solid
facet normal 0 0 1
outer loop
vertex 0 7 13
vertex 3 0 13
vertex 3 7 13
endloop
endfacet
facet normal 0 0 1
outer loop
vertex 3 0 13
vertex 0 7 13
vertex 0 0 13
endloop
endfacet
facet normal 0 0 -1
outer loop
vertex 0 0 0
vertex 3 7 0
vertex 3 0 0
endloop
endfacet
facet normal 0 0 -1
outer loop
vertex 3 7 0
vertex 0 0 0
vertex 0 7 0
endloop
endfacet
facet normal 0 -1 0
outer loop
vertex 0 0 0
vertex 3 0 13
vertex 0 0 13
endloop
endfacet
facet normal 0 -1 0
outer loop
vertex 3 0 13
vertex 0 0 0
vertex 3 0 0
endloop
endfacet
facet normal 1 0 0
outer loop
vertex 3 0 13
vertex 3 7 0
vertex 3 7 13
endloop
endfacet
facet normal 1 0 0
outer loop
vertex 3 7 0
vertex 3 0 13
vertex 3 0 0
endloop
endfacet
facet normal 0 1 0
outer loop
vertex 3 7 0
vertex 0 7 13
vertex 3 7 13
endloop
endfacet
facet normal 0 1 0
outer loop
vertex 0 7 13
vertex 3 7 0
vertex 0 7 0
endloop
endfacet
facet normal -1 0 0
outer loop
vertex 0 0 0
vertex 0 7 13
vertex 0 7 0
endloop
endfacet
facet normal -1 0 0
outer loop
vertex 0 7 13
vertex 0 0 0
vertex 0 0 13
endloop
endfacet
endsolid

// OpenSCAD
// Generated by SolidPython 1.0.1 on 2020-07-29 00:46:54


cube(size = [3, 7, 13]);
/***********************************************
*********      SolidPython code:      **********
************************************************
 
# import packages: SolidPython
from solid import *
from solid.utils import *
from itertools import chain, combinations, permutations


class Resize:

    def __init__(self, scad_file):
        self.scad_file = scad_file
        #self.scad_file = import_scad(scad_file)
        # cone/cylinder param:
        self.r1 = 0
        self.r2 = 0
        self.h = 0
        # rectangular prism param:
        self.w = 0
        self.l = 0
        # ellipse param:
        self.r = 0

    # import OpenScad code (file name corresponds to shape)


    # classify shape + parameters
    def assign(self, param1, param2, param3):
        if self.scad_file == 'cone.scad':
            self.r1 = param1
            self.r2 = param2
            self.h = param3
        elif self.scad_file == 'cylinder.scad':
            self.r1 = param1
            self.r2 = param2
            self.h = param3
        elif self.scad_file == 'rectangularPrism.scad':
            self.h = param1
            self.l = param2
            self.w = param3
        else:
            self.r = param1
            self.h = param2

    # resize parameters
    def iterate(self):
        x = range(3, 20, 2)
        i = 1
        if self.scad_file == 'cone.scad':
            tempList = list(permutations(x, 2))
            for temp in tempList:
                param1 = temp[0]
                param2 = temp[1]
                filepath = 'produced_scad_files/' + 'cone' + str(param1) + '_' + str(param2) + '_' + '.scad'
                scad_render_to_file(cylinder(h=param1, r1=param2, r2=0), filepath)

        elif self.scad_file == 'cylinder.scad':
            tempList = list(permutations(x, 3))
            for temp in tempList:
                param1 = temp[0]
                param2 = temp[1]
                filepath = 'produced_scad_files/' + 'cylinder' + str(param1) + '_' + str(param2) + '_' + '.scad'
                scad_render_to_file(cylinder(h=param1, r1=param2, r2=param2), filepath)

        elif self.scad_file == 'rectangularPrism.scad':
            tempList = list(permutations(x, 3))
            for temp in tempList:
                param1 = temp[0]
                param2 = temp[1]
                param3 = temp[2]
                filepath = 'produced_scad_files/' + 'rectangularPrism' + str(param1) + '_' + str(param2) + '_' + str(
                    param3) + '.scad'
                scad_render_to_file(cube(size=(param1, param2, param3)), filepath)

        elif self.scad_file == 'ellipse.scad':
            tempList = list(permutations(x, 4))
            for temp in tempList:
                param1 = temp[0]
                param2 = temp[1]
                param3 = temp[2]
                param4 = temp[3]
                filepath = 'produced_scad_files/' + 'ellipse' + str(param1) + '_' + str(param2) + '_' + str(param3) + '_' + str(param4) + '.scad'
                scad_render_to_file(scale([param1, param2, param3])(sphere(r=param4)), filepath)

    def render_to_scadfile(self):
        scad_render_to_file(scad, 'example.scad') 
 
************************************************/
